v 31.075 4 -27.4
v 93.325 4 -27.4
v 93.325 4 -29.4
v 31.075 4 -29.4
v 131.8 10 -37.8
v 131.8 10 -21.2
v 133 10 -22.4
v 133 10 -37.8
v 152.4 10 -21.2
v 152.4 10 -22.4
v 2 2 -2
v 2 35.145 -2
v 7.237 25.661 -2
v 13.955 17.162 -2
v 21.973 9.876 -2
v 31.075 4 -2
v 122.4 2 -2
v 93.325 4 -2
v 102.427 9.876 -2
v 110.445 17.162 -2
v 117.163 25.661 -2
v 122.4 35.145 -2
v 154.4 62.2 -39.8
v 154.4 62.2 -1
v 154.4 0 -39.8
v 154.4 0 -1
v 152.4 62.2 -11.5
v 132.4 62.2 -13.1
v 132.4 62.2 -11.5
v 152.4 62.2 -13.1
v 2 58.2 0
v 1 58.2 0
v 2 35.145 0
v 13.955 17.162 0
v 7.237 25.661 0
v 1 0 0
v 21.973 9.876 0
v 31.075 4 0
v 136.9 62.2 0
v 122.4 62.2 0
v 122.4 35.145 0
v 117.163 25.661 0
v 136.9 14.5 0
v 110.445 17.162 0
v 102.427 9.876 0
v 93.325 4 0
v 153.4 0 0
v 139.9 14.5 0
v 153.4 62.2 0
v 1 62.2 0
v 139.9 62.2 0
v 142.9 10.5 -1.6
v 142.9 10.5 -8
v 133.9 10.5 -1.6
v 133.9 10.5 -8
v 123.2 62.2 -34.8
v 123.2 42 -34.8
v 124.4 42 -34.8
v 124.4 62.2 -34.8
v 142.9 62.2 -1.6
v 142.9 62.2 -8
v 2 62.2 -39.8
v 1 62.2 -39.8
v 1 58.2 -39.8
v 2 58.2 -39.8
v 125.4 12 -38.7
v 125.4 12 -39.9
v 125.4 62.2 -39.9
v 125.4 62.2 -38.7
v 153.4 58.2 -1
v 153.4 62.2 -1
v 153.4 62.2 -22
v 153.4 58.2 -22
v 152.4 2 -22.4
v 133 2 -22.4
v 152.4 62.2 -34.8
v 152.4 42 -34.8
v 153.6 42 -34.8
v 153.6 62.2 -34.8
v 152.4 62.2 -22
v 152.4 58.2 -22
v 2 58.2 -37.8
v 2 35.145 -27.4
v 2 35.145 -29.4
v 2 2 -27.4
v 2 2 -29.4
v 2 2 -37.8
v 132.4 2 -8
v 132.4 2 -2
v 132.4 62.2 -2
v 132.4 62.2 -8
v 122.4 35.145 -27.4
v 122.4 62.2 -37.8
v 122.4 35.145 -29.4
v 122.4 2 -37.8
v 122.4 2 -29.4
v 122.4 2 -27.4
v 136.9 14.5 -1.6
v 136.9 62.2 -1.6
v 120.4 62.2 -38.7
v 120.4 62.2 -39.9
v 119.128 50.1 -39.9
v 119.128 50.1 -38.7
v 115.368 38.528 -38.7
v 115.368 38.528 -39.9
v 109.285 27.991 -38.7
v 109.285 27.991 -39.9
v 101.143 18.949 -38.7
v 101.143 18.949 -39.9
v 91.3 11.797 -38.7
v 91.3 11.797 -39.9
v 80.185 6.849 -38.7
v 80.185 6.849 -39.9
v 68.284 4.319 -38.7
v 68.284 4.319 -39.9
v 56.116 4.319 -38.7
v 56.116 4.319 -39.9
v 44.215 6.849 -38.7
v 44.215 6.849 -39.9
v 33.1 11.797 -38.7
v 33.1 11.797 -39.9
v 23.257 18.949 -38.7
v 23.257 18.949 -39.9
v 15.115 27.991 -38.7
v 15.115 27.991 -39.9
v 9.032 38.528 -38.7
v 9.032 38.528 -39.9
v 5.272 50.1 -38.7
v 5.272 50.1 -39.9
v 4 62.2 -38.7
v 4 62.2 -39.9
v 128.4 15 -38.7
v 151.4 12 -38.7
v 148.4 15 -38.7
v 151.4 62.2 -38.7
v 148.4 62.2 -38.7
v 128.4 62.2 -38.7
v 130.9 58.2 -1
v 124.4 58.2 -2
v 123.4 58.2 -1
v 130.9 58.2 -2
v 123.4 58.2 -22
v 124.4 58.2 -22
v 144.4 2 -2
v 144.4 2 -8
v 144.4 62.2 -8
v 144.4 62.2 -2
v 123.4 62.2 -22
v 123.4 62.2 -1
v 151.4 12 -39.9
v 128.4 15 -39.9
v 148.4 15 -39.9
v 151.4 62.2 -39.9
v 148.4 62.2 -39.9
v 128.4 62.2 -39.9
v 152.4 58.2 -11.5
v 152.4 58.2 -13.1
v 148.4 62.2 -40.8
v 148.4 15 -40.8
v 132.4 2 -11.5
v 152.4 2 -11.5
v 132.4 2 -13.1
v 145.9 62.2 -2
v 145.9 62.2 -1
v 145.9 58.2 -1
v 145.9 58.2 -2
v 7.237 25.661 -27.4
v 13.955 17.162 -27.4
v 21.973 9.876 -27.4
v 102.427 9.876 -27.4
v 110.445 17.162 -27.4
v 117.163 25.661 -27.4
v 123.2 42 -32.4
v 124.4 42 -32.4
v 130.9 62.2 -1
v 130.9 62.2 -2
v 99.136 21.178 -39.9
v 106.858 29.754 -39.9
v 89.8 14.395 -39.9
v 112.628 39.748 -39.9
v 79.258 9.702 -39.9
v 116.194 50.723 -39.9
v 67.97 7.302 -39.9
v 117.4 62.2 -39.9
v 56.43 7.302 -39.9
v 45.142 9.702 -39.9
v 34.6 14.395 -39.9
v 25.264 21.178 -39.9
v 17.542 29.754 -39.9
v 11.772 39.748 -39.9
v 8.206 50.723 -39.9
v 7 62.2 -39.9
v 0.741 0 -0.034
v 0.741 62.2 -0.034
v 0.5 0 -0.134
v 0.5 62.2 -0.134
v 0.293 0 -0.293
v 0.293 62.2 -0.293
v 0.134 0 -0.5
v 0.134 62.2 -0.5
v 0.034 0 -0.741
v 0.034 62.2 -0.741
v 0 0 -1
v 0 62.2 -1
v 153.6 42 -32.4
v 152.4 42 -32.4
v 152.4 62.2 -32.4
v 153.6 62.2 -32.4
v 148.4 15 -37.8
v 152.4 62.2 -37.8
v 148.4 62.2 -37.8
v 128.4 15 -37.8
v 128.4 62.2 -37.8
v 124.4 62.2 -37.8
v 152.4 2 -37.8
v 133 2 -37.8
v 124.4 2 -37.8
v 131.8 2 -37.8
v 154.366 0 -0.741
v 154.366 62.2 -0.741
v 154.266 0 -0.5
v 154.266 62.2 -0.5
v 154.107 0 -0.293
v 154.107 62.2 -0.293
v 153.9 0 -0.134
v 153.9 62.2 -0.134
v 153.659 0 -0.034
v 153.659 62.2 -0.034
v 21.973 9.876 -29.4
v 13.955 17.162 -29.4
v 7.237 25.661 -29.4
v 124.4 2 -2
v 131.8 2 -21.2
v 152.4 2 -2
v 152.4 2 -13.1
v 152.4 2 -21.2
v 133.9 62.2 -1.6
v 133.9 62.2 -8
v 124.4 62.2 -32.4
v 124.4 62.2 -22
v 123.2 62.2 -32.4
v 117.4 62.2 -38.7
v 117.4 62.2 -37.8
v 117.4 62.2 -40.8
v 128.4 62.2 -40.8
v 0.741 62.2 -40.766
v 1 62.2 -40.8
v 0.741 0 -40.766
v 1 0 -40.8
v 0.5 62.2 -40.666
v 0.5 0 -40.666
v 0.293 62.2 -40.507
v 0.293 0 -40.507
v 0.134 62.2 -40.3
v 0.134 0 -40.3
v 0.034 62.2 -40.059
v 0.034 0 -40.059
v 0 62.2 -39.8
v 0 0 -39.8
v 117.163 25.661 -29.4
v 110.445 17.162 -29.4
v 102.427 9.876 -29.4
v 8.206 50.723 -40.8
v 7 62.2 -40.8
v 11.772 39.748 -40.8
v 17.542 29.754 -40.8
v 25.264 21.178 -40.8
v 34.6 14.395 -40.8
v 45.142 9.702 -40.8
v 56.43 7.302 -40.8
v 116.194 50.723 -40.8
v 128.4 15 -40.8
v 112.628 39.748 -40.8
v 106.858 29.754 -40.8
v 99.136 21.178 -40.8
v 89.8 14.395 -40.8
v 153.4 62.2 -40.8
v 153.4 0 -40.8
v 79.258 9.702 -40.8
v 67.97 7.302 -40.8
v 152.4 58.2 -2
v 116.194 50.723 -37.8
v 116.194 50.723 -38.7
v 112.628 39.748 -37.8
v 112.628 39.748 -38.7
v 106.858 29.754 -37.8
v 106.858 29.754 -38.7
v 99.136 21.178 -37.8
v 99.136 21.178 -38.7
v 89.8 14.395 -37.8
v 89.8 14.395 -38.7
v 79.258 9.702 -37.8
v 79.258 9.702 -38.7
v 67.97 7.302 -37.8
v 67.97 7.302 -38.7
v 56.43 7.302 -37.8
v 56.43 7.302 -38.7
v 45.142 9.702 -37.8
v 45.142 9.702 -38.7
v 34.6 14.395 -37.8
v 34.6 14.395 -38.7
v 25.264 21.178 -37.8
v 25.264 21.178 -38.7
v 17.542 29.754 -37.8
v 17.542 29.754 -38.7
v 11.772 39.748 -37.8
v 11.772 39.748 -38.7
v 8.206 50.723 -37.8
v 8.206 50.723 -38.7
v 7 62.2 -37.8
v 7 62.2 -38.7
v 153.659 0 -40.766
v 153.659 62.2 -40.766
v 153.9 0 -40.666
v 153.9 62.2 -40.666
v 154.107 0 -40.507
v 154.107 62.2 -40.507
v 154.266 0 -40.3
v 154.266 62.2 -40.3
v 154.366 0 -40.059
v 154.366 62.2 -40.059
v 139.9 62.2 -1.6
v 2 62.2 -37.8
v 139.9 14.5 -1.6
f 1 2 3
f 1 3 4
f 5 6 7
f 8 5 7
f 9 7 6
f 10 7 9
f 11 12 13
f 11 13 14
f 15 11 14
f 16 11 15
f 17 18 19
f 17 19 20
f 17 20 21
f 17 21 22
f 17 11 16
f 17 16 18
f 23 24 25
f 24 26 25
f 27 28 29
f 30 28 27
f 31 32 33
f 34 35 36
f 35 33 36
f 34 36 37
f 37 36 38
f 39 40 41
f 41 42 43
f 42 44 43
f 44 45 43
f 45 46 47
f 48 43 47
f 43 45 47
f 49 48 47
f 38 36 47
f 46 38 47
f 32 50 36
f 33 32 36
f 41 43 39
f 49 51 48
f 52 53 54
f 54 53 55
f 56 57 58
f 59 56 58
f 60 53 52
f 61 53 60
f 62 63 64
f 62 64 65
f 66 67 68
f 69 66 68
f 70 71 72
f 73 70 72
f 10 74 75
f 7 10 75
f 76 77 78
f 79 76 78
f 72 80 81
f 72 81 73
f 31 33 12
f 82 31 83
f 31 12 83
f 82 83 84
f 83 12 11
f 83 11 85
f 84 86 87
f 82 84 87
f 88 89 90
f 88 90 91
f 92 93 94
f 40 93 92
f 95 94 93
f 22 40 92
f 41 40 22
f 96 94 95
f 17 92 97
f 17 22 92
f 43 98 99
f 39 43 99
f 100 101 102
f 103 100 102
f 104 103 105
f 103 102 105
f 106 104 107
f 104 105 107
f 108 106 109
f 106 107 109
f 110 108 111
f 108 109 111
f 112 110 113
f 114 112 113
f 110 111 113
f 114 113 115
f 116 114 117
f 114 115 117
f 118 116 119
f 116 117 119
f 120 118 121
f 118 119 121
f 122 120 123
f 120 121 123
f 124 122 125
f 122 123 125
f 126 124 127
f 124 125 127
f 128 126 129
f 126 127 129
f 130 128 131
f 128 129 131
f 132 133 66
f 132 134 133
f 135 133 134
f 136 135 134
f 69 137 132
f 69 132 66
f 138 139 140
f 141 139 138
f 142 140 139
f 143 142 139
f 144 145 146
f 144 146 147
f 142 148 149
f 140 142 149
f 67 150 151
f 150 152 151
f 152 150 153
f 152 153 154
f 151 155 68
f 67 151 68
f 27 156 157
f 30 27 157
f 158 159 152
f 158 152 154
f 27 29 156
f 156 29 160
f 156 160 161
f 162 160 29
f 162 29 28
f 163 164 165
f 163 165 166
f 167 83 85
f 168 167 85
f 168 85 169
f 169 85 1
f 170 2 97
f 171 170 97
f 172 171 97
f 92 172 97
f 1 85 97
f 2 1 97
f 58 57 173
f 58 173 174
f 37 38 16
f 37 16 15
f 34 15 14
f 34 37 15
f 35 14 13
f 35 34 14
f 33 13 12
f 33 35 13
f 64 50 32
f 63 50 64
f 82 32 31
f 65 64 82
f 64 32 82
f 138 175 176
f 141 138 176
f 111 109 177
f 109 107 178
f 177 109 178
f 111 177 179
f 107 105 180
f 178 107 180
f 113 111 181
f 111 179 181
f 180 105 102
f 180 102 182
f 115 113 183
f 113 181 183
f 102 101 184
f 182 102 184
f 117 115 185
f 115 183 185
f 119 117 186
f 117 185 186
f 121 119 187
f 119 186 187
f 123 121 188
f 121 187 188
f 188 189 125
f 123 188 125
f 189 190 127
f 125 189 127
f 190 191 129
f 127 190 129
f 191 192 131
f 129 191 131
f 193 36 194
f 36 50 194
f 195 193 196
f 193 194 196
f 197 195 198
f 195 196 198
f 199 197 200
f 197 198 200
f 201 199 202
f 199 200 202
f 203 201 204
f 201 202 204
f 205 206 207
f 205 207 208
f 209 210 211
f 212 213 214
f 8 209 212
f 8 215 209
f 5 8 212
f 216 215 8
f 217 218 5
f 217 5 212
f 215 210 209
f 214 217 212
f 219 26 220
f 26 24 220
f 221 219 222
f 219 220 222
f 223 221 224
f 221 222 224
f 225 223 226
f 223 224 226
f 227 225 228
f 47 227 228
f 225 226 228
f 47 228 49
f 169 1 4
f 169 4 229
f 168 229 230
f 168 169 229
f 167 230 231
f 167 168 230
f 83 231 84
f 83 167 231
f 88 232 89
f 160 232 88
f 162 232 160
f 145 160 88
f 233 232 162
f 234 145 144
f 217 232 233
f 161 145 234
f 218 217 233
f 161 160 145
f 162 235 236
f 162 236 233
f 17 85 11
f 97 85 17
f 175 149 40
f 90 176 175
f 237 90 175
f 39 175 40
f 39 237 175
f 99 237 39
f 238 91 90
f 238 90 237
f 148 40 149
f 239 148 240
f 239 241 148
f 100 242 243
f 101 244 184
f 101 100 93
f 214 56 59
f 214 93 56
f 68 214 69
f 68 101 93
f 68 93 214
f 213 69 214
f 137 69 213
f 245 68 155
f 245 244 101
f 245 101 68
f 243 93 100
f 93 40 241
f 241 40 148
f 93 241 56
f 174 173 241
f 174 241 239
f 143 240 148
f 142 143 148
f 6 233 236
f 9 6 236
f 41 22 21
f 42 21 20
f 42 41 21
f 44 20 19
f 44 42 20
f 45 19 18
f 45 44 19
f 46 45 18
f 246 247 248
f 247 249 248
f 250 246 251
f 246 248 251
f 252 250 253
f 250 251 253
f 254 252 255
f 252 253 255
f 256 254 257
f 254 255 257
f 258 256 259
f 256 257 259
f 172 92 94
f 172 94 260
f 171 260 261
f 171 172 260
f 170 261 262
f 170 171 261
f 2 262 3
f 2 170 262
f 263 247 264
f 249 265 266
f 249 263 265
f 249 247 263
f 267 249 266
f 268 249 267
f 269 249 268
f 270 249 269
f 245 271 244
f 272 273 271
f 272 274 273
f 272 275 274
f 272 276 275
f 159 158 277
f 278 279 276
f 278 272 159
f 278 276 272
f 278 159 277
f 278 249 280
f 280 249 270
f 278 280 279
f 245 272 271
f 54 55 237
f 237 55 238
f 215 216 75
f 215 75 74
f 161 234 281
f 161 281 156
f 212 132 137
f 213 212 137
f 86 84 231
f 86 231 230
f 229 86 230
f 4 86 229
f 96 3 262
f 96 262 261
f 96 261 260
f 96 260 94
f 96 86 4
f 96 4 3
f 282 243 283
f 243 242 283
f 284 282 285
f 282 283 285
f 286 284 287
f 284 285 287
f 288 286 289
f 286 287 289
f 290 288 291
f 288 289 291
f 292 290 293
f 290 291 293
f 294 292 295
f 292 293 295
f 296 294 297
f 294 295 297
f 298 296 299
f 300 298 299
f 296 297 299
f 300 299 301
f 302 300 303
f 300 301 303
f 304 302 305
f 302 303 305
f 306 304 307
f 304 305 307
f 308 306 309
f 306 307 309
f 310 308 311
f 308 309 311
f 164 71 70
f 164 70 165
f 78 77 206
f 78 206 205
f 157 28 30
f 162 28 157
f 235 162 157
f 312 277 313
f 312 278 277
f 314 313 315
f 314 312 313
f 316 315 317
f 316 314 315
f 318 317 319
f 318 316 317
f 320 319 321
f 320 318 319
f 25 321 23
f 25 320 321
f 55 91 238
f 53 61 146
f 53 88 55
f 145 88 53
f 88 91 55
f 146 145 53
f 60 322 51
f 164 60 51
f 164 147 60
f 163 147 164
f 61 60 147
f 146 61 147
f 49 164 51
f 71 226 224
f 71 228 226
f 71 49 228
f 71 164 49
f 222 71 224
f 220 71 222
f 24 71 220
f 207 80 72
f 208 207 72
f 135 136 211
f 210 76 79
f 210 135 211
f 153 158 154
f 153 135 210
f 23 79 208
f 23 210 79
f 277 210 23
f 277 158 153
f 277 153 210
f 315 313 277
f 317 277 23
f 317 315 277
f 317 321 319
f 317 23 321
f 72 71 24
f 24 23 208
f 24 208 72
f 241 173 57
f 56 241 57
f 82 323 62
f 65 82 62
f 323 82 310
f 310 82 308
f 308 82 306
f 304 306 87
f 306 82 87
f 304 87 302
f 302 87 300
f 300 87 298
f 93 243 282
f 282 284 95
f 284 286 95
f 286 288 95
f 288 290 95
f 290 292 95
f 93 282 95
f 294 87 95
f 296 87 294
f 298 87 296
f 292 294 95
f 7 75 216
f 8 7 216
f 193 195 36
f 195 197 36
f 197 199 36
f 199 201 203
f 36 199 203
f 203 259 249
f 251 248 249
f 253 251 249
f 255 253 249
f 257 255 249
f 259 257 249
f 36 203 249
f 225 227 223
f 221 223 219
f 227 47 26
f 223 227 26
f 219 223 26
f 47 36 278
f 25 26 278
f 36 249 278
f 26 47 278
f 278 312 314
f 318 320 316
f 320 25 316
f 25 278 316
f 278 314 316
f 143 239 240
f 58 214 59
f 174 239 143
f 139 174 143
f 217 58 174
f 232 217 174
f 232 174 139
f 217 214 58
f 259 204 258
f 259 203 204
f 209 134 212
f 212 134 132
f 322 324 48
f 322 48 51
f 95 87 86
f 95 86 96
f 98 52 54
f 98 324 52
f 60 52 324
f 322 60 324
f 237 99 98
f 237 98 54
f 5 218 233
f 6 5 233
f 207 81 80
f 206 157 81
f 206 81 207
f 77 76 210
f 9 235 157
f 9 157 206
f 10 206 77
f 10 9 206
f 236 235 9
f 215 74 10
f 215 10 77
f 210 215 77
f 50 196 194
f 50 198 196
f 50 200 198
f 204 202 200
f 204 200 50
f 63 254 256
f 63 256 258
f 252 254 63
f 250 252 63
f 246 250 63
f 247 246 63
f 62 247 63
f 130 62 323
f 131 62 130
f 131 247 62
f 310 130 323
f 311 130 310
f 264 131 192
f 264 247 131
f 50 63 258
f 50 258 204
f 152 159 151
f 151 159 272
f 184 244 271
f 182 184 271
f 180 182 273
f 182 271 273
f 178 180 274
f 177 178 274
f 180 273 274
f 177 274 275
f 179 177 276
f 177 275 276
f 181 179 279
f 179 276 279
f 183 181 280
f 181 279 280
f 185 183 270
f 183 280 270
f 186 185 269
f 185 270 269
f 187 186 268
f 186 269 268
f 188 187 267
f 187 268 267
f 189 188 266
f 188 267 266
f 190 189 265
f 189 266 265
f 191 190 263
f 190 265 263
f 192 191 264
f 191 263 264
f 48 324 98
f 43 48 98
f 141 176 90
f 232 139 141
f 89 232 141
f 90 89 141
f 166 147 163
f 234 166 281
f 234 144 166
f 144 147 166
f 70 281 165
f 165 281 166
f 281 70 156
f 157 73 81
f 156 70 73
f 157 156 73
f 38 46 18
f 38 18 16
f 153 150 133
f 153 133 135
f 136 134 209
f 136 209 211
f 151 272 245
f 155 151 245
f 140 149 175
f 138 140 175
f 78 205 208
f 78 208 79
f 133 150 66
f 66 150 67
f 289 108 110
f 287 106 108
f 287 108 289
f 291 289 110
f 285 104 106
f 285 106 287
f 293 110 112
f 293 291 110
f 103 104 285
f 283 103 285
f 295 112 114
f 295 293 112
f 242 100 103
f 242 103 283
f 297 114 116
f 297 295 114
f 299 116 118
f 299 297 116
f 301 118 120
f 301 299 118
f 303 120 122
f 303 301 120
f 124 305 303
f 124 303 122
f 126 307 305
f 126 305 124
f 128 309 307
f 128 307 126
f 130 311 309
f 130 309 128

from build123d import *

# Parameters (mm, degrees)
ESQUISSE1_W              = 154.4
ESQUISSE1_H              = 40.8
BOSS_EXTRU_1_DEPTH       = 2
ESQUISSE2_W              = 154.4
ESQUISSE2_H              = 40.8
ESQUISSE2_W_2            = 120.4
ESQUISSE2_H_2            = 8.4
ESQUISSE2_H_3            = 25.4
BOSS_EXTRU_2_DEPTH       = 60.2
ENL_V_MAT_EXTRU_1_REACH  = 173.385
ESQUISSE4_W              = 1
ESQUISSE4_H              = 39.8
ENL_V_MAT_EXTRU_2_DEPTH  = 4
ESQUISSE5_W              = 1.2
ESQUISSE5_H              = 2.4
ENL_V_MAT_EXTRU_3_DEPTH  = 20.2
BOSS_EXTRU_3_DEPTH       = 8
ESQUISSE9_W              = 9
ESQUISSE9_H              = 51.7
ENL_V_MAT_EXTRU_5_DEPTH  = 6.4
ESQUISSE10_W             = 3
ESQUISSE10_H             = 47.7
ENL_V_MAT_EXTRU_6_DEPTH  = 172.011227702
ESQUISSE11_W             = 20
ESQUISSE11_H             = 1.6
BOSS_EXTRU_4_DEPTH       = 60.2
ENL_V_MAT_EXTRU_7_REACH  = 173.385
ESQUISSE12_R             = 55.2
ENL_V_START              = -0.9
ESQUISSE14_R             = 58.2
ENL_V_MAT_EXTRU_8_DEPTH  = 1.2
CONG_1_R                 = 1
ENL_V_MAT_EXTRU_9_REACH  = 173.385
ESQUISSE15_W             = 20
ESQUISSE15_H             = 47.2
ESQUISSE16_W             = 26
ESQUISSE16_H             = 53.2
ESQUISSE16_W_2           = 20
ESQUISSE16_H_2           = 47.2
ENL_V_MAT_EXTRU_11_DEPTH = 1.2


with BuildPart() as part:
    # Esquisse1 → Boss.-Extru.1 (new body)
    with BuildSketch(Plane(origin=(0, 0, 0), x_dir=(1, 0, 0), z_dir=(0, 1, 0))):
        with Locations((77.2, 20.4)):
            Rectangle(ESQUISSE1_W, ESQUISSE1_H)
    extrude(amount=BOSS_EXTRU_1_DEPTH)

    # Esquisse2 → Boss.-Extru.2 (add)
    with BuildSketch(Plane(origin=(0, 2, 0), x_dir=(1, 0, 0), z_dir=(0, 1, 0))):
        with Locations((77.2, 20.4)):
            Rectangle(ESQUISSE2_W, ESQUISSE2_H)
        with Locations((62.2, 33.6)):
            Rectangle(ESQUISSE2_W_2, ESQUISSE2_H_2, mode=Mode.SUBTRACT)
        with Locations((62.2, 14.7)):
            Rectangle(ESQUISSE2_W_2, ESQUISSE2_H_3, mode=Mode.SUBTRACT)
        Polygon((124.4, 37.8), (124.4, 2), (132.4, 2), (132.4, 8), (144.4, 8), (144.4, 2), (152.4, 2), (152.4, 37.8), align=None, mode=Mode.SUBTRACT)
    extrude(amount=BOSS_EXTRU_2_DEPTH)

    # Enlèv. mat.-Extru.1: up to this face of the body (flat: up to its plane)
    enl_v_mat_extru_1_end = Plane(part.part.faces().sort_by_distance((62.2, 32.1, -29.4))[0])
    # Esquisse3 → Enlèv. mat.-Extru.1 (cut, up to the picked face)
    with BuildSketch(Plane.XY, mode=Mode.PRIVATE) as enl_v_mat_extru_1_sk1:
        with BuildLine():
            Line((2, 62.2), (122.4, 62.2))
            Line((122.4, 62.2), (122.4, 35.145240714))
            ThreePointArc((122.4, 35.145240714), (110.444857601, 17.16186377), (93.324909638, 4))
            Line((93.324909638, 4), (31.075090362, 4))
            ThreePointArc((31.075090362, 4), (13.955142399, 17.16186377), (2, 35.145240714))
            Line((2, 35.145240714), (2, 62.2))
        make_face()
    enl_v_mat_extru_1_tool1 = split(extrude(enl_v_mat_extru_1_sk1.sketch, amount=-ENL_V_MAT_EXTRU_1_REACH, mode=Mode.PRIVATE), bisect_by=enl_v_mat_extru_1_end, keep=Keep.BOTH, mode=Mode.PRIVATE)
    add(enl_v_mat_extru_1_tool1.solids().sort_by(Axis((62.2, 35.325026, 0), (0, 0, -1)))[0], mode=Mode.SUBTRACT)

    # Esquisse4 → Enlèv. mat.-Extru.2 (cut)
    with BuildSketch(Plane(origin=(0, 62.2, 0), x_dir=(1, 0, 0), z_dir=(0, 1, 0))):
        with Locations((1.5, 19.9)):
            Rectangle(ESQUISSE4_W, ESQUISSE4_H)
        Polygon((130.9, 1), (130.9, 2), (124.4, 2), (124.4, 22), (123.4, 22), (123.4, 2), (123.4, 1), align=None)
        Polygon((152.4, 2), (152.4, 22), (153.4, 22), (153.4, 2), (153.4, 1), (145.9, 1), (145.9, 2), align=None)
    extrude(amount=-ENL_V_MAT_EXTRU_2_DEPTH, mode=Mode.SUBTRACT)

    # Esquisse5 → Enlèv. mat.-Extru.3 (cut)
    with BuildSketch(Plane(origin=(0, 62.2, 0), x_dir=(1, 0, 0), z_dir=(0, 1, 0))):
        with Locations((123.8, 33.6)):
            Rectangle(ESQUISSE5_W, ESQUISSE5_H)
        with Locations((153, 33.6)):
            Rectangle(ESQUISSE5_W, ESQUISSE5_H)
    extrude(amount=-ENL_V_MAT_EXTRU_3_DEPTH, mode=Mode.SUBTRACT)

    # Esquisse6 → Boss.-Extru.3 (add)
    with BuildSketch(Plane(origin=(0, 2, 0), x_dir=(1, 0, 0), z_dir=(0, 1, 0))):
        Polygon((133, 22.4), (133, 37.8), (131.8, 37.8), (131.8, 21.2), (152.4, 21.2), (152.4, 22.4), align=None)
    extrude(amount=BOSS_EXTRU_3_DEPTH)

    # Esquisse9 → Enlèv. mat.-Extru.5 (cut)
    with BuildSketch(Plane(origin=(0, 0, -8), x_dir=(-1, 0, 0), z_dir=(0, 0, -1))):
        with Locations((-138.4, 36.35)):
            Rectangle(ESQUISSE9_W, ESQUISSE9_H)
    extrude(amount=-ENL_V_MAT_EXTRU_5_DEPTH, mode=Mode.SUBTRACT)

    # Esquisse10 → Enlèv. mat.-Extru.6 (cut, through all)
    with BuildSketch(Plane(origin=(0, 0, -1.6), x_dir=(-1, 0, 0), z_dir=(0, 0, -1))):
        with Locations((-138.4, 38.35)):
            Rectangle(ESQUISSE10_W, ESQUISSE10_H)
    extrude(amount=-ENL_V_MAT_EXTRU_6_DEPTH, mode=Mode.SUBTRACT)

    # Esquisse11 → Boss.-Extru.4 (add)
    with BuildSketch(Plane(origin=(0, 2, 0), x_dir=(1, 0, 0), z_dir=(0, 1, 0))):
        with Locations((142.4, 12.3)):
            Rectangle(ESQUISSE11_W, ESQUISSE11_H)
    extrude(amount=BOSS_EXTRU_4_DEPTH)

    # Esquisse12 → Enlèv. mat.-Extru.7 (cut, up to next)
    with BuildSketch(Plane(origin=(0, 0, -40.8), x_dir=(-1, 0, 0), z_dir=(0, 0, -1)), mode=Mode.PRIVATE) as enl_v_mat_extru_7_sk1:
        with Locations((-62.2, 62.2)):
            Circle(ESQUISSE12_R)
    enl_v_mat_extru_7_tool1 = extrude(enl_v_mat_extru_7_sk1.sketch, amount=-ENL_V_MAT_EXTRU_7_REACH, mode=Mode.PRIVATE) & part.part
    add(enl_v_mat_extru_7_tool1.solids().sort_by_distance((62.2, 62.2, -40.8))[0], mode=Mode.SUBTRACT)

    # Esquisse14 → Enlèv. mat.-Extru.8 (cut)
    with BuildSketch(Plane(origin=(0, 0, -40.8), x_dir=(-1, 0, 0), z_dir=(0, 0, -1)).offset(ENL_V_START)):
        with Locations((-62.2, 62.2)):
            Circle(ESQUISSE14_R)
    extrude(amount=-ENL_V_MAT_EXTRU_8_DEPTH, mode=Mode.SUBTRACT)

    # Congé1
    cong_1_edges = [part.edges().sort_by_distance(p)[0] for p in [
        (0, 31.1, -40.8),
        (154.4, 31.1, -40.8),
        (154.4, 31.1, 0),
        (0, 31.1, 0),
    ]]
    fillet(cong_1_edges, radius=CONG_1_R - 0.0001)  # a hair under: the kernel refuses the full size

    # Esquisse15 → Enlèv. mat.-Extru.9 (cut, up to next)
    with BuildSketch(Plane(origin=(0, 0, -40.8), x_dir=(-1, 0, 0), z_dir=(0, 0, -1)), mode=Mode.PRIVATE) as enl_v_mat_extru_9_sk1:
        with Locations((-138.4, 38.6)):
            Rectangle(ESQUISSE15_W, ESQUISSE15_H)
    enl_v_mat_extru_9_tool1 = extrude(enl_v_mat_extru_9_sk1.sketch, amount=-ENL_V_MAT_EXTRU_9_REACH, mode=Mode.PRIVATE) & part.part
    add(enl_v_mat_extru_9_tool1.solids().sort_by_distance((138.4, 38.6, -40.8))[0], mode=Mode.SUBTRACT)

    # Esquisse16 → Enlèv. mat.-Extru.11 (cut)
    with BuildSketch(Plane(origin=(0, 0, -40.8), x_dir=(-1, 0, 0), z_dir=(0, 0, -1)).offset(ENL_V_START)):
        with Locations((-138.4, 38.6)):
            Rectangle(ESQUISSE16_W, ESQUISSE16_H)
        with Locations((-138.4, 38.6)):
            Rectangle(ESQUISSE16_W_2, ESQUISSE16_H_2, mode=Mode.SUBTRACT)
    extrude(amount=-ENL_V_MAT_EXTRU_11_DEPTH, mode=Mode.SUBTRACT)


solid = part.part
